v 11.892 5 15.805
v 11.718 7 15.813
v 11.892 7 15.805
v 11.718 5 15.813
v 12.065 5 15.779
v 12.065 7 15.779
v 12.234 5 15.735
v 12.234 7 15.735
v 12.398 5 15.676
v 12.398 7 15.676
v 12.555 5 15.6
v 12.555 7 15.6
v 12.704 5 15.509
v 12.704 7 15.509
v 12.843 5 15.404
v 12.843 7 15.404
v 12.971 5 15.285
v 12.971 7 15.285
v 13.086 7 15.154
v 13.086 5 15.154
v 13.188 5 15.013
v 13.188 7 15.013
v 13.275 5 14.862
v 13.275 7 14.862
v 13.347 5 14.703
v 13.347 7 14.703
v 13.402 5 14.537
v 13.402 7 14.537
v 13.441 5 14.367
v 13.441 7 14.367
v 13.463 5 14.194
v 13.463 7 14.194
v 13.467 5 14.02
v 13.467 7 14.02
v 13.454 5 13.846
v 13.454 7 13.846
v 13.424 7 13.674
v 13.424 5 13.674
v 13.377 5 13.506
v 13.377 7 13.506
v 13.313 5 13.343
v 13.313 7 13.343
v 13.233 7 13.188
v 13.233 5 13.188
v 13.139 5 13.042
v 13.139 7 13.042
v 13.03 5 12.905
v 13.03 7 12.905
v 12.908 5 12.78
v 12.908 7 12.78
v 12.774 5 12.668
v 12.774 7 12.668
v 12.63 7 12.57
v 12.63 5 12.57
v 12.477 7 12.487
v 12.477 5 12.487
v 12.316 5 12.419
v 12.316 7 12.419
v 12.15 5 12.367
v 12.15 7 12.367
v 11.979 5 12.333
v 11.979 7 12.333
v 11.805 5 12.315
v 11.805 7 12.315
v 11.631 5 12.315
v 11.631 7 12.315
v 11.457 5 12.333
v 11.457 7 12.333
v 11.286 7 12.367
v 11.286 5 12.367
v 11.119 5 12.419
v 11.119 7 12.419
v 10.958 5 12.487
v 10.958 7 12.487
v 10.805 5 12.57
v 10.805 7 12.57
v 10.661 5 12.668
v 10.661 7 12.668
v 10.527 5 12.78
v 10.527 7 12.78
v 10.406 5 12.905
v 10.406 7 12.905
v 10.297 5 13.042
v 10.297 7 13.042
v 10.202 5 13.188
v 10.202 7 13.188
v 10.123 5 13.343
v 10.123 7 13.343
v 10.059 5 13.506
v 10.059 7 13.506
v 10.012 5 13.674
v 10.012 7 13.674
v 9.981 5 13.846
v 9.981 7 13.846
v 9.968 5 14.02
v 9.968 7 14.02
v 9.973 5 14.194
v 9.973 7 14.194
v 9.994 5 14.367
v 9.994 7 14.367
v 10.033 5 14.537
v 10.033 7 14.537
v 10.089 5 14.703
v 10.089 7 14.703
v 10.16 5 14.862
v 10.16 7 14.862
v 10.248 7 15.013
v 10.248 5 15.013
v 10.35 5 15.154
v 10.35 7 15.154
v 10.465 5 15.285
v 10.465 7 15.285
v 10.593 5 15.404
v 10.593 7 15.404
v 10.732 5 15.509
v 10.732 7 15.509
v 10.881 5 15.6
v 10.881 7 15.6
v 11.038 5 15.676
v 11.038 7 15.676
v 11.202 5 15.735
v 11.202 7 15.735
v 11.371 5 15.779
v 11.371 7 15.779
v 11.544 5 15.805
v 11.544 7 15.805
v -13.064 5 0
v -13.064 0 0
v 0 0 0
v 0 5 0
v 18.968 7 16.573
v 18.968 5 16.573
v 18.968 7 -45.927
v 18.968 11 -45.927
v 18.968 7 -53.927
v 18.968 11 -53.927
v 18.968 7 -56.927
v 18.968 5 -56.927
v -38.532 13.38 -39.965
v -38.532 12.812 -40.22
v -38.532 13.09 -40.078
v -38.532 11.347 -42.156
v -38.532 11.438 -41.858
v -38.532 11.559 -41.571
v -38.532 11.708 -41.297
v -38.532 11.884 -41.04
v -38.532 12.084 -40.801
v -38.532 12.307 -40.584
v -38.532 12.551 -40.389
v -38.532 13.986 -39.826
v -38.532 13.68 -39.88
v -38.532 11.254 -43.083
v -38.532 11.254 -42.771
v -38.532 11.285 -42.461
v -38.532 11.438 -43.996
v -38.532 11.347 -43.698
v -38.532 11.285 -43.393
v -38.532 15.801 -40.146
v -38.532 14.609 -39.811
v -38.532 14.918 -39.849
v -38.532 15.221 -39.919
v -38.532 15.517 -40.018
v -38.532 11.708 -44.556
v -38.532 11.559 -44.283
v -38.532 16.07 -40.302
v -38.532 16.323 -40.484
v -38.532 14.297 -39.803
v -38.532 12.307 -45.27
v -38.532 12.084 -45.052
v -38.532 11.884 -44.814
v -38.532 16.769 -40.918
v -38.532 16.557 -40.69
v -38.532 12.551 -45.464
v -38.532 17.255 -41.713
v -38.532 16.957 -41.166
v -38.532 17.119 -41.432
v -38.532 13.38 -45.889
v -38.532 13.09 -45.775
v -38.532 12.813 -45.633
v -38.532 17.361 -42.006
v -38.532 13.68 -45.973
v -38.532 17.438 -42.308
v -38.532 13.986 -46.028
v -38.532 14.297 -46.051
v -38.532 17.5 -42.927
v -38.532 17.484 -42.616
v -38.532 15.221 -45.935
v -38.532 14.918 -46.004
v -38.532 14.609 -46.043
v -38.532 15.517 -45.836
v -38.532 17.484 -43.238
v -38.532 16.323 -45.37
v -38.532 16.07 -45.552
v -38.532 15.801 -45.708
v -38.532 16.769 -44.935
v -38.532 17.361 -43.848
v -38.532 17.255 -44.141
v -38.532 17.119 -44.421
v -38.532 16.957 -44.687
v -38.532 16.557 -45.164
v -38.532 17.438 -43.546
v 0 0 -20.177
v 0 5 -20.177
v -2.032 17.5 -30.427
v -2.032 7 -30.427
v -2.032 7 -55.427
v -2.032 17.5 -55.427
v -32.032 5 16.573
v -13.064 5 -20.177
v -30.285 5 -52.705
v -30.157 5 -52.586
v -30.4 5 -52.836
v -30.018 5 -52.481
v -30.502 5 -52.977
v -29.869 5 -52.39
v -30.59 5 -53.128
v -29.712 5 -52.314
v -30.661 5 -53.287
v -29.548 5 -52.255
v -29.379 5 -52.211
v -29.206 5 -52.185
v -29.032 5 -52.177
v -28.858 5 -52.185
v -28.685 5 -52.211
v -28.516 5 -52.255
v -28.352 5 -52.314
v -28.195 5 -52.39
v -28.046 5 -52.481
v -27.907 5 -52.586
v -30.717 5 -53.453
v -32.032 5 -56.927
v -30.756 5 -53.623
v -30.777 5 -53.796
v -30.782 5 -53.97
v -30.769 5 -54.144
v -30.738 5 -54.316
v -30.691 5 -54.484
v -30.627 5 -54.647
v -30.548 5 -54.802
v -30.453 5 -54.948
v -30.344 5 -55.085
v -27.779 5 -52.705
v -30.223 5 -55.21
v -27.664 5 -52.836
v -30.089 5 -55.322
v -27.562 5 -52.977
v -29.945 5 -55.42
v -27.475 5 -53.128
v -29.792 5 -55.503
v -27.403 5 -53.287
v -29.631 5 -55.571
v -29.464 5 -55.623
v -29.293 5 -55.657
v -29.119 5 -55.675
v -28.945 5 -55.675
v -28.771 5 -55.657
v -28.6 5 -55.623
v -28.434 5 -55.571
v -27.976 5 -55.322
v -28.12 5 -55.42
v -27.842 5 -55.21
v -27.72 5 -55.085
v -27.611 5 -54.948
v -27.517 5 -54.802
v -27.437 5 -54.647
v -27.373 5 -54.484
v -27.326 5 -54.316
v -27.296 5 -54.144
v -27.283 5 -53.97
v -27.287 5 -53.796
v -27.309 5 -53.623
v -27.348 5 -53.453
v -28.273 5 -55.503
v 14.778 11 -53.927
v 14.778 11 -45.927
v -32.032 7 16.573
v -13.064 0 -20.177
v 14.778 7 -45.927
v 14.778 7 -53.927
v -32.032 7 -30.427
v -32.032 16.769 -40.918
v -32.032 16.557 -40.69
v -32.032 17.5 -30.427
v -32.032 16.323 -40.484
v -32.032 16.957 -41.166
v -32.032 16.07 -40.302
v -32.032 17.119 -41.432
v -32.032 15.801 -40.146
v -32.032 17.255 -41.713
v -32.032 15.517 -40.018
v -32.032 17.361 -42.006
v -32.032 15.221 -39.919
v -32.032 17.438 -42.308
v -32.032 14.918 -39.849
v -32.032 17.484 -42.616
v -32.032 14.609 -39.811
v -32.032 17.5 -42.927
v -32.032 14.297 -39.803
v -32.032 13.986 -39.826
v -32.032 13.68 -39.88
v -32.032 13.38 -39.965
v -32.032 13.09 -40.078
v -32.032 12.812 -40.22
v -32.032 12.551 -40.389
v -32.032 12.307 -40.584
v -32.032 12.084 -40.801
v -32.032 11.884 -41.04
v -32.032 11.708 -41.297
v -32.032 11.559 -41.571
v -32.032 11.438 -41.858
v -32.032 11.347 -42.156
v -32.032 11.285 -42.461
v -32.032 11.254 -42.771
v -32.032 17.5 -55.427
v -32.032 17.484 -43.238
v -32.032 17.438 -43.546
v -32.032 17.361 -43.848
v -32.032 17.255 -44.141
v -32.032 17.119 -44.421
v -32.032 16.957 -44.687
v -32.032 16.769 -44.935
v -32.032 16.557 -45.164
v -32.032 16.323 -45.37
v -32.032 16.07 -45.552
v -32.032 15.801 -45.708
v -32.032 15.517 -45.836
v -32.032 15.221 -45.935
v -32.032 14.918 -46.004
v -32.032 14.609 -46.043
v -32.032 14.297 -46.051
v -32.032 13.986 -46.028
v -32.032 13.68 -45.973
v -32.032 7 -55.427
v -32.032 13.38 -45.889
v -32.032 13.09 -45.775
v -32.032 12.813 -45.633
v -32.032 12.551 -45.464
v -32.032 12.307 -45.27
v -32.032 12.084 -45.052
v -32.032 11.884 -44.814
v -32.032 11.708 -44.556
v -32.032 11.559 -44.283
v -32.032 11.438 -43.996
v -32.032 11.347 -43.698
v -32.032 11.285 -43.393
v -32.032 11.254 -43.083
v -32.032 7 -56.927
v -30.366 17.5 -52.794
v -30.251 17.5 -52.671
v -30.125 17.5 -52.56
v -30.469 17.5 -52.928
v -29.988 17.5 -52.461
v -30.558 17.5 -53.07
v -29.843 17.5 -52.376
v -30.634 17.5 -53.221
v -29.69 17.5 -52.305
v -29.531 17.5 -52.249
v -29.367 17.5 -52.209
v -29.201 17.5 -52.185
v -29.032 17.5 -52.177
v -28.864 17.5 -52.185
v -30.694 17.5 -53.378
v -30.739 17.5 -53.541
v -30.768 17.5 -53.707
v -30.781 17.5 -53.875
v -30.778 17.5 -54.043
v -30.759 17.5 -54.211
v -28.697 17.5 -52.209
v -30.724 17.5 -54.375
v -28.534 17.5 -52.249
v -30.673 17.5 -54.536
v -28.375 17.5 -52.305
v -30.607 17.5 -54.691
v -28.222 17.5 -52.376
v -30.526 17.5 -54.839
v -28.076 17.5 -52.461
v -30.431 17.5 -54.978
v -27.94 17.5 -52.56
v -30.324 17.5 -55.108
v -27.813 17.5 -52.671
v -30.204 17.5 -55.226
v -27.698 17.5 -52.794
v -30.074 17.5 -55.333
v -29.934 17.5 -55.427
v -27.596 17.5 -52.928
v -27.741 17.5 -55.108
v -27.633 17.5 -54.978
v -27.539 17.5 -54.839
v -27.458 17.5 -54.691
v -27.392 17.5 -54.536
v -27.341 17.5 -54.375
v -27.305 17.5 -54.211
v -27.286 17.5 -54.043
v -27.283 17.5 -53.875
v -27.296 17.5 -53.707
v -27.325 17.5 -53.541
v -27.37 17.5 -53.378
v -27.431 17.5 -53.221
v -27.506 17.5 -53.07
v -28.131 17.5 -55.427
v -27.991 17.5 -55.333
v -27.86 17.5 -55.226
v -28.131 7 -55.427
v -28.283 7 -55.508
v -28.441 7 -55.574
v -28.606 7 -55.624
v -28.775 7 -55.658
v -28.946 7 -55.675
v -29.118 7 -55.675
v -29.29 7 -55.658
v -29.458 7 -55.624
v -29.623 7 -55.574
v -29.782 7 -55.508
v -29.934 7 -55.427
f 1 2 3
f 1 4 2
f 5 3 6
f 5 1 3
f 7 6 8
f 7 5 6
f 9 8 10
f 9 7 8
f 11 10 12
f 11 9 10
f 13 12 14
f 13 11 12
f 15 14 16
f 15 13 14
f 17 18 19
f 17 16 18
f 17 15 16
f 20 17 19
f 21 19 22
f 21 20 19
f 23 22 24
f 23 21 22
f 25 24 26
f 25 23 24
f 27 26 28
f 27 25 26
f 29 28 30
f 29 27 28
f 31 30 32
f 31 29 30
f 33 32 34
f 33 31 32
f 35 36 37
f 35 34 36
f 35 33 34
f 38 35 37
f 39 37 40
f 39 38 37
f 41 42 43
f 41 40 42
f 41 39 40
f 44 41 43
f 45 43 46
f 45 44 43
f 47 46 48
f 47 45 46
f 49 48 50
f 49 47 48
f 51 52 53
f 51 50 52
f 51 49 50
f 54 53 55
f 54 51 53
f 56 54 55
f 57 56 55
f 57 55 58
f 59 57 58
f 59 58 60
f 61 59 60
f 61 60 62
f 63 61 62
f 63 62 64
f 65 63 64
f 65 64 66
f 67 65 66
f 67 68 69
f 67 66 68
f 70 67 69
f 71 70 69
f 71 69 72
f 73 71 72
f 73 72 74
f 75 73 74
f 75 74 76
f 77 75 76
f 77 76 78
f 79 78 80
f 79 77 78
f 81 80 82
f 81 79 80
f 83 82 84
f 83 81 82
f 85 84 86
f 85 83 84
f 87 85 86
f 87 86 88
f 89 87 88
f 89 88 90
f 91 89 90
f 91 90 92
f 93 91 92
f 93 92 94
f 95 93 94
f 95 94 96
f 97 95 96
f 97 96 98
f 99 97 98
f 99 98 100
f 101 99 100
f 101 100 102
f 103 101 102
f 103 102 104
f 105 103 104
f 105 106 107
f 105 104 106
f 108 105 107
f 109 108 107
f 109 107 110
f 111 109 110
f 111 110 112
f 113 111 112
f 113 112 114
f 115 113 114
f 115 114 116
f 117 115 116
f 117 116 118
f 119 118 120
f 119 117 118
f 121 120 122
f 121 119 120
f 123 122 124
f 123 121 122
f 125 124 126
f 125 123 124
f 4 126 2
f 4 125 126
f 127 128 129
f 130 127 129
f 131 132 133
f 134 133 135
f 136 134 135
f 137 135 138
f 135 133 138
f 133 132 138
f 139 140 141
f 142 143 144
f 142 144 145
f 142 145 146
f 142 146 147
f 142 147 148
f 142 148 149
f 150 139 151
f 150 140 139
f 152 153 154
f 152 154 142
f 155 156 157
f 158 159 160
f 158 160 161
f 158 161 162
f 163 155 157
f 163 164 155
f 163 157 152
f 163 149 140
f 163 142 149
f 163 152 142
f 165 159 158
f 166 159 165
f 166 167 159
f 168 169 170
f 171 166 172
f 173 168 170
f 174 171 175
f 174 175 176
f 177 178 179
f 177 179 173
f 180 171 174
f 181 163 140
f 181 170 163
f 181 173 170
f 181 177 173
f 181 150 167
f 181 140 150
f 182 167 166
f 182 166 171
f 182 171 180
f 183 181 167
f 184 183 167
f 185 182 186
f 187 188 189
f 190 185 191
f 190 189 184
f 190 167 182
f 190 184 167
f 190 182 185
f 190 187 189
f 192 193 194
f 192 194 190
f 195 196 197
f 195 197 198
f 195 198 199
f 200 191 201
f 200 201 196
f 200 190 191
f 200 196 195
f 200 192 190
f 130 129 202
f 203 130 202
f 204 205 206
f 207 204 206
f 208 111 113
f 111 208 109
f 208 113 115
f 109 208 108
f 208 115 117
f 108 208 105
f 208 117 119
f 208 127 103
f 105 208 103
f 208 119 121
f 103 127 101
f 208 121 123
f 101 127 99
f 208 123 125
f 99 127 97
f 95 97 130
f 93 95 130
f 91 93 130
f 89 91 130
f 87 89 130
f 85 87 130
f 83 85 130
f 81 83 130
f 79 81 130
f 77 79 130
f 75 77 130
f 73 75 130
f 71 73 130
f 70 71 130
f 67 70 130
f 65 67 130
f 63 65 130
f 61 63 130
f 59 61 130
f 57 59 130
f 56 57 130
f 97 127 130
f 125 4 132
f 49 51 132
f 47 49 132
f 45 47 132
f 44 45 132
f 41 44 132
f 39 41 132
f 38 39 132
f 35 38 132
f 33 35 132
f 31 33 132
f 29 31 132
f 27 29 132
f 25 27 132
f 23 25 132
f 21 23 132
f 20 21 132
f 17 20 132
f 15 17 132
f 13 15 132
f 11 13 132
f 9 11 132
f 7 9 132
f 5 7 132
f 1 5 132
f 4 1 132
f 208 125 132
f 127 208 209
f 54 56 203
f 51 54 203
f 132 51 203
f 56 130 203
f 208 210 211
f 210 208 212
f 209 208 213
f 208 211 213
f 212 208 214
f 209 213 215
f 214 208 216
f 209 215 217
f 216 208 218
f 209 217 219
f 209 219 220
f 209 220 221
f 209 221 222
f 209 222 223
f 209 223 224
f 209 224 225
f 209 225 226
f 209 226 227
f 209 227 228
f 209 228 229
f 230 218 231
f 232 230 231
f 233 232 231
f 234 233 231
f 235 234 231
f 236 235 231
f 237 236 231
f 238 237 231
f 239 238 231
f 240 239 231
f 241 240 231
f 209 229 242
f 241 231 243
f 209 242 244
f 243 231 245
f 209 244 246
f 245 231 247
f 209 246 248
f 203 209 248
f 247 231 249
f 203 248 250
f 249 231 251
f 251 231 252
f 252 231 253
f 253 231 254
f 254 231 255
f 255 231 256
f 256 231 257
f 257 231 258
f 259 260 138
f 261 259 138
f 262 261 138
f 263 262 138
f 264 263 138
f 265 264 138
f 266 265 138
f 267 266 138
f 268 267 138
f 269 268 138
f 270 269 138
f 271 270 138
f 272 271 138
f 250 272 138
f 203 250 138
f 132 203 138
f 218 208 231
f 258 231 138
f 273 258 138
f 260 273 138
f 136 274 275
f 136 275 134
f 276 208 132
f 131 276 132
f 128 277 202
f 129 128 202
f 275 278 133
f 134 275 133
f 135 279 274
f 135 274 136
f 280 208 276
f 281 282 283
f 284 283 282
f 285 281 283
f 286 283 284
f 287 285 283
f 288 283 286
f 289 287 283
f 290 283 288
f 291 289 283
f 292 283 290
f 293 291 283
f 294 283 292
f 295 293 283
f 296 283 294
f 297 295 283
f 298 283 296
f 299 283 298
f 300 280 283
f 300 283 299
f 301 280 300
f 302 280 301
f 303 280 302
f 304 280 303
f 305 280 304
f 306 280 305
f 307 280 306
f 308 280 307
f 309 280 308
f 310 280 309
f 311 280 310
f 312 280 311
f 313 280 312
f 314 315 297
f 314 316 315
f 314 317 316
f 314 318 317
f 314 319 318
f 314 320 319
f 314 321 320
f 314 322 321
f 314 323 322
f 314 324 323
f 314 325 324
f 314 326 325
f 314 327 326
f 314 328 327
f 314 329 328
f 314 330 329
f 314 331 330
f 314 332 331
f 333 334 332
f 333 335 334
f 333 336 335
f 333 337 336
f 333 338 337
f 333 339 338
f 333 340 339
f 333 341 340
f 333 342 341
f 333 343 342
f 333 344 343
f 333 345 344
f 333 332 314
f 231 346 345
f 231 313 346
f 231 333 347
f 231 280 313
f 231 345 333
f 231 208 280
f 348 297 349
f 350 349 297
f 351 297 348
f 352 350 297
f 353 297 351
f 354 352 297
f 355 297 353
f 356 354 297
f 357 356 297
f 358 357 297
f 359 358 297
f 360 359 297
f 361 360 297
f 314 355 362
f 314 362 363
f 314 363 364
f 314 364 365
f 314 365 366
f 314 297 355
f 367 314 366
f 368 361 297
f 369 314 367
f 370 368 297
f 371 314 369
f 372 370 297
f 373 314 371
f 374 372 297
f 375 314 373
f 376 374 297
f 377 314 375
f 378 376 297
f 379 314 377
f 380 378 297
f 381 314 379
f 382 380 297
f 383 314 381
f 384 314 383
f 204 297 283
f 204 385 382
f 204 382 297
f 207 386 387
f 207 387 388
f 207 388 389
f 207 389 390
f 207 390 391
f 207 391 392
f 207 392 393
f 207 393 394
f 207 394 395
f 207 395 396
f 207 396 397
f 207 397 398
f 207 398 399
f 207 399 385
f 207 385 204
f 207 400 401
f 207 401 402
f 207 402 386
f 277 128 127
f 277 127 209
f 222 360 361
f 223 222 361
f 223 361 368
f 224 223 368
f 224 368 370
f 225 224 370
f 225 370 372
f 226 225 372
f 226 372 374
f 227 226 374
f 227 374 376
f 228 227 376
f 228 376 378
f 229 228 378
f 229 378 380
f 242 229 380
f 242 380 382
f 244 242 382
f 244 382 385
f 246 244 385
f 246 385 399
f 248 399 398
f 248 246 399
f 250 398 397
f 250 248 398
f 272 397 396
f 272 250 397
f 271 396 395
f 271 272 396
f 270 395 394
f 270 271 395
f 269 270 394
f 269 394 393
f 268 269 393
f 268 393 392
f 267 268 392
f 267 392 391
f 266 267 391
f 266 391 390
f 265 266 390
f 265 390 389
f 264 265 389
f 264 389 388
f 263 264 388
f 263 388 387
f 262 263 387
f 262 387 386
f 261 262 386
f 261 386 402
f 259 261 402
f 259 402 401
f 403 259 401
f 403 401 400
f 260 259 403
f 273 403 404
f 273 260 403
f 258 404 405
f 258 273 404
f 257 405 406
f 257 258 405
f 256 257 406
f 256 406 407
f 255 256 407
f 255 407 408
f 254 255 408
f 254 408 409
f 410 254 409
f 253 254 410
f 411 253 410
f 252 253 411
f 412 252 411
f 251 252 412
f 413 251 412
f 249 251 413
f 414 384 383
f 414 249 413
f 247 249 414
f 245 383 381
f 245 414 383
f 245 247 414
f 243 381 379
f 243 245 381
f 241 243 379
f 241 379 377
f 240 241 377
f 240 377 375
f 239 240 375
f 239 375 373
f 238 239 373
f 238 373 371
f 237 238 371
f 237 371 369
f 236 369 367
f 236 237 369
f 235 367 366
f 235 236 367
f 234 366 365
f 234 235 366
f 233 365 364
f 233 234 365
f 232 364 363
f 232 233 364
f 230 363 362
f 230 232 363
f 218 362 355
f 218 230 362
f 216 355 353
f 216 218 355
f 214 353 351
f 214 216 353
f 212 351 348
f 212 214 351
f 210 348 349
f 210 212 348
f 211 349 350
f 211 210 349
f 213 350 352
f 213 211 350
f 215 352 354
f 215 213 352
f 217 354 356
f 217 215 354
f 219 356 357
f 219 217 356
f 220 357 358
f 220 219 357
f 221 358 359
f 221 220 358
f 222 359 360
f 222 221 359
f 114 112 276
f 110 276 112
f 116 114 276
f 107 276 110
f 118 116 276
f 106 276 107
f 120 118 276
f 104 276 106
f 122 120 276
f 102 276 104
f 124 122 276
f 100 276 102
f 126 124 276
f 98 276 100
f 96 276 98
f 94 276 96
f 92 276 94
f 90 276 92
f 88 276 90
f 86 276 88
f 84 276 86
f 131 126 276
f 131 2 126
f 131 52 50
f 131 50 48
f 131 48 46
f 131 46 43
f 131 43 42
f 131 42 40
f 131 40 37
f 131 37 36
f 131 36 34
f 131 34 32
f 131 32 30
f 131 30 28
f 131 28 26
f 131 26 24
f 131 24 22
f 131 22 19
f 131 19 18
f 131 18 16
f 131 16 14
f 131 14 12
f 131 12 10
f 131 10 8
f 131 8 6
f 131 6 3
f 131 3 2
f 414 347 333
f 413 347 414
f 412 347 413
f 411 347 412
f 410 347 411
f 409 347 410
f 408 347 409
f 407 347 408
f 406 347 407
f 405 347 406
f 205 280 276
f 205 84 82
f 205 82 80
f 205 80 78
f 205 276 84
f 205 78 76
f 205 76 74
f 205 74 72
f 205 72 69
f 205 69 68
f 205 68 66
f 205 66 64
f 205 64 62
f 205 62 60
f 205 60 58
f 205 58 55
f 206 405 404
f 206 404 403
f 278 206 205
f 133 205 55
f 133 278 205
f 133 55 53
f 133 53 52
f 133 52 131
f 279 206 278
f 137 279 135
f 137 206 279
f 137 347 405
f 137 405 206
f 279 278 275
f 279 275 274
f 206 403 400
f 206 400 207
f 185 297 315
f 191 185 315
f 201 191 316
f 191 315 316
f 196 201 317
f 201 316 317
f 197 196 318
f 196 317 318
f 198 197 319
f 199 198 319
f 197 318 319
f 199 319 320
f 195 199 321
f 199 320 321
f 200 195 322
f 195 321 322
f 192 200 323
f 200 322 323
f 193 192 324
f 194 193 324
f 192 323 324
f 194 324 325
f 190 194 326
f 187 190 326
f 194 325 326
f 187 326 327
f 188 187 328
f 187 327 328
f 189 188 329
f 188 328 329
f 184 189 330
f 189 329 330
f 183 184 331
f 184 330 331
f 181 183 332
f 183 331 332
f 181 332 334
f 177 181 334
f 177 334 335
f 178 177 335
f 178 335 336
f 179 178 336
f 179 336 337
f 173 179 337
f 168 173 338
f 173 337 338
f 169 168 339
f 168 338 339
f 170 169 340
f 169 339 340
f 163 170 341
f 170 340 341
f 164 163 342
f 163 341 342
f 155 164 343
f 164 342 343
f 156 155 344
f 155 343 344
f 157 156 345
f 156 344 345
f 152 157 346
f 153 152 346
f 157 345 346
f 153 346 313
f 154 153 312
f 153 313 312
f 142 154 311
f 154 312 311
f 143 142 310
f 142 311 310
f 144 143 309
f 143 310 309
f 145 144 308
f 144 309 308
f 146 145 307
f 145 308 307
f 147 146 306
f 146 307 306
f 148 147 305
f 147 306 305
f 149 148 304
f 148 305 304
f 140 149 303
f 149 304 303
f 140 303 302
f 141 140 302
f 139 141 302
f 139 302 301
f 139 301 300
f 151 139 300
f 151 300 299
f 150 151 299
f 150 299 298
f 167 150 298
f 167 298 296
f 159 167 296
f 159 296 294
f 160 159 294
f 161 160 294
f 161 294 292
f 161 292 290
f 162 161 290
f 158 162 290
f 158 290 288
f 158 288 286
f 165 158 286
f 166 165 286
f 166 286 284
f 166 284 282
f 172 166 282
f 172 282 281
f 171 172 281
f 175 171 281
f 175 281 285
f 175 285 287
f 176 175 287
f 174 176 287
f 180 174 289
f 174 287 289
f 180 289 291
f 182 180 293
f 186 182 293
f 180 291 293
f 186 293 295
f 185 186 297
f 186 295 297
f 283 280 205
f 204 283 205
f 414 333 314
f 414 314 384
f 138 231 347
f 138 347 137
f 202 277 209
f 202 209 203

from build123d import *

# Parameters (mm, degrees)
SKETCH1_W               = 13.064472239
SKETCH1_H               = 20.176787348
BOSS_EXTRUDE1_DEPTH     = 5
SKETCH2_W               = 51
SKETCH2_H               = 73.5
BOSS_EXTRUDE2_DEPTH     = 2
SKETCH3_W               = 30
SKETCH3_H               = 25
BOSS_EXTRUDE3_DEPTH     = 10.5
SKETCH7_R               = 3.125
BOSS_EXTRUDE5_DEPTH     = 6.5
SKETCH8_W               = 4.189265903
SKETCH8_H               = 8
BOSS_EXTRUDE6_DEPTH     = 4
CUT_EXTRUDE1_DEPTH      = 70.538782979
CUT_EXTRUDE1_DEPTH_BACK = 70.538782979
SKETCH9_R               = 1.75


with BuildPart() as part:
    # Sketch1 → Boss-Extrude1 (new body)
    with BuildSketch(Plane(origin=(0, 0, 0), x_dir=(1, 0, 0), z_dir=(0, 1, 0))):
        with Locations((-6.53223612, 10.088393674)):
            Rectangle(SKETCH1_W, SKETCH1_H)
    extrude(amount=BOSS_EXTRUDE1_DEPTH)

    # Sketch2 → Boss-Extrude2 (add)
    with BuildSketch(Plane(origin=(0, 5, 0), x_dir=(1, 0, 0), z_dir=(0, 1, 0))):
        with Locations((-6.53223612, 20.176787348)):
            Rectangle(SKETCH2_W, SKETCH2_H)
    extrude(amount=BOSS_EXTRUDE2_DEPTH)

    # Sketch3 → Boss-Extrude3 (add)
    with BuildSketch(Plane(origin=(0, 7, 0), x_dir=(1, 0, 0), z_dir=(0, 1, 0))):
        with Locations((-17.03223612, 42.926787348)):
            Rectangle(SKETCH3_W, SKETCH3_H)
    extrude(amount=BOSS_EXTRUDE3_DEPTH)

    # Sketch7 → Boss-Extrude5 (add)
    with BuildSketch(Plane.ZY.offset(32.03223612)):
        with Locations(Location((-42.926787348, 14.375, 0), (0, 0, 90))):
            Circle(SKETCH7_R)
    extrude(amount=BOSS_EXTRUDE5_DEPTH)

    # Sketch8 → Boss-Extrude6 (add)
    with BuildSketch(Plane(origin=(0, 7, 0), x_dir=(1, 0, 0), z_dir=(0, 1, 0))):
        with Locations((16.873130929, 49.926787348)):
            Rectangle(SKETCH8_W, SKETCH8_H)
    extrude(amount=BOSS_EXTRUDE6_DEPTH)

    # Sketch9 → Cut-Extrude1 (cut, two sides: drawn at the far end of the back side and taken through both)
    with BuildSketch(Plane(origin=(0, 7, 0), x_dir=(1, 0, 0), z_dir=(0, 1, 0)).offset(-CUT_EXTRUDE1_DEPTH_BACK)):
        with Locations(Location((11.71776388, -14.063212652, 0), (0, 0, 270))):
            Circle(SKETCH9_R)
        with Locations(Location((-29.03223612, 53.926787348, 0), (0, 0, 270))):
            Circle(SKETCH9_R)
    extrude(amount=CUT_EXTRUDE1_DEPTH + CUT_EXTRUDE1_DEPTH_BACK, mode=Mode.SUBTRACT)


solid = part.part
